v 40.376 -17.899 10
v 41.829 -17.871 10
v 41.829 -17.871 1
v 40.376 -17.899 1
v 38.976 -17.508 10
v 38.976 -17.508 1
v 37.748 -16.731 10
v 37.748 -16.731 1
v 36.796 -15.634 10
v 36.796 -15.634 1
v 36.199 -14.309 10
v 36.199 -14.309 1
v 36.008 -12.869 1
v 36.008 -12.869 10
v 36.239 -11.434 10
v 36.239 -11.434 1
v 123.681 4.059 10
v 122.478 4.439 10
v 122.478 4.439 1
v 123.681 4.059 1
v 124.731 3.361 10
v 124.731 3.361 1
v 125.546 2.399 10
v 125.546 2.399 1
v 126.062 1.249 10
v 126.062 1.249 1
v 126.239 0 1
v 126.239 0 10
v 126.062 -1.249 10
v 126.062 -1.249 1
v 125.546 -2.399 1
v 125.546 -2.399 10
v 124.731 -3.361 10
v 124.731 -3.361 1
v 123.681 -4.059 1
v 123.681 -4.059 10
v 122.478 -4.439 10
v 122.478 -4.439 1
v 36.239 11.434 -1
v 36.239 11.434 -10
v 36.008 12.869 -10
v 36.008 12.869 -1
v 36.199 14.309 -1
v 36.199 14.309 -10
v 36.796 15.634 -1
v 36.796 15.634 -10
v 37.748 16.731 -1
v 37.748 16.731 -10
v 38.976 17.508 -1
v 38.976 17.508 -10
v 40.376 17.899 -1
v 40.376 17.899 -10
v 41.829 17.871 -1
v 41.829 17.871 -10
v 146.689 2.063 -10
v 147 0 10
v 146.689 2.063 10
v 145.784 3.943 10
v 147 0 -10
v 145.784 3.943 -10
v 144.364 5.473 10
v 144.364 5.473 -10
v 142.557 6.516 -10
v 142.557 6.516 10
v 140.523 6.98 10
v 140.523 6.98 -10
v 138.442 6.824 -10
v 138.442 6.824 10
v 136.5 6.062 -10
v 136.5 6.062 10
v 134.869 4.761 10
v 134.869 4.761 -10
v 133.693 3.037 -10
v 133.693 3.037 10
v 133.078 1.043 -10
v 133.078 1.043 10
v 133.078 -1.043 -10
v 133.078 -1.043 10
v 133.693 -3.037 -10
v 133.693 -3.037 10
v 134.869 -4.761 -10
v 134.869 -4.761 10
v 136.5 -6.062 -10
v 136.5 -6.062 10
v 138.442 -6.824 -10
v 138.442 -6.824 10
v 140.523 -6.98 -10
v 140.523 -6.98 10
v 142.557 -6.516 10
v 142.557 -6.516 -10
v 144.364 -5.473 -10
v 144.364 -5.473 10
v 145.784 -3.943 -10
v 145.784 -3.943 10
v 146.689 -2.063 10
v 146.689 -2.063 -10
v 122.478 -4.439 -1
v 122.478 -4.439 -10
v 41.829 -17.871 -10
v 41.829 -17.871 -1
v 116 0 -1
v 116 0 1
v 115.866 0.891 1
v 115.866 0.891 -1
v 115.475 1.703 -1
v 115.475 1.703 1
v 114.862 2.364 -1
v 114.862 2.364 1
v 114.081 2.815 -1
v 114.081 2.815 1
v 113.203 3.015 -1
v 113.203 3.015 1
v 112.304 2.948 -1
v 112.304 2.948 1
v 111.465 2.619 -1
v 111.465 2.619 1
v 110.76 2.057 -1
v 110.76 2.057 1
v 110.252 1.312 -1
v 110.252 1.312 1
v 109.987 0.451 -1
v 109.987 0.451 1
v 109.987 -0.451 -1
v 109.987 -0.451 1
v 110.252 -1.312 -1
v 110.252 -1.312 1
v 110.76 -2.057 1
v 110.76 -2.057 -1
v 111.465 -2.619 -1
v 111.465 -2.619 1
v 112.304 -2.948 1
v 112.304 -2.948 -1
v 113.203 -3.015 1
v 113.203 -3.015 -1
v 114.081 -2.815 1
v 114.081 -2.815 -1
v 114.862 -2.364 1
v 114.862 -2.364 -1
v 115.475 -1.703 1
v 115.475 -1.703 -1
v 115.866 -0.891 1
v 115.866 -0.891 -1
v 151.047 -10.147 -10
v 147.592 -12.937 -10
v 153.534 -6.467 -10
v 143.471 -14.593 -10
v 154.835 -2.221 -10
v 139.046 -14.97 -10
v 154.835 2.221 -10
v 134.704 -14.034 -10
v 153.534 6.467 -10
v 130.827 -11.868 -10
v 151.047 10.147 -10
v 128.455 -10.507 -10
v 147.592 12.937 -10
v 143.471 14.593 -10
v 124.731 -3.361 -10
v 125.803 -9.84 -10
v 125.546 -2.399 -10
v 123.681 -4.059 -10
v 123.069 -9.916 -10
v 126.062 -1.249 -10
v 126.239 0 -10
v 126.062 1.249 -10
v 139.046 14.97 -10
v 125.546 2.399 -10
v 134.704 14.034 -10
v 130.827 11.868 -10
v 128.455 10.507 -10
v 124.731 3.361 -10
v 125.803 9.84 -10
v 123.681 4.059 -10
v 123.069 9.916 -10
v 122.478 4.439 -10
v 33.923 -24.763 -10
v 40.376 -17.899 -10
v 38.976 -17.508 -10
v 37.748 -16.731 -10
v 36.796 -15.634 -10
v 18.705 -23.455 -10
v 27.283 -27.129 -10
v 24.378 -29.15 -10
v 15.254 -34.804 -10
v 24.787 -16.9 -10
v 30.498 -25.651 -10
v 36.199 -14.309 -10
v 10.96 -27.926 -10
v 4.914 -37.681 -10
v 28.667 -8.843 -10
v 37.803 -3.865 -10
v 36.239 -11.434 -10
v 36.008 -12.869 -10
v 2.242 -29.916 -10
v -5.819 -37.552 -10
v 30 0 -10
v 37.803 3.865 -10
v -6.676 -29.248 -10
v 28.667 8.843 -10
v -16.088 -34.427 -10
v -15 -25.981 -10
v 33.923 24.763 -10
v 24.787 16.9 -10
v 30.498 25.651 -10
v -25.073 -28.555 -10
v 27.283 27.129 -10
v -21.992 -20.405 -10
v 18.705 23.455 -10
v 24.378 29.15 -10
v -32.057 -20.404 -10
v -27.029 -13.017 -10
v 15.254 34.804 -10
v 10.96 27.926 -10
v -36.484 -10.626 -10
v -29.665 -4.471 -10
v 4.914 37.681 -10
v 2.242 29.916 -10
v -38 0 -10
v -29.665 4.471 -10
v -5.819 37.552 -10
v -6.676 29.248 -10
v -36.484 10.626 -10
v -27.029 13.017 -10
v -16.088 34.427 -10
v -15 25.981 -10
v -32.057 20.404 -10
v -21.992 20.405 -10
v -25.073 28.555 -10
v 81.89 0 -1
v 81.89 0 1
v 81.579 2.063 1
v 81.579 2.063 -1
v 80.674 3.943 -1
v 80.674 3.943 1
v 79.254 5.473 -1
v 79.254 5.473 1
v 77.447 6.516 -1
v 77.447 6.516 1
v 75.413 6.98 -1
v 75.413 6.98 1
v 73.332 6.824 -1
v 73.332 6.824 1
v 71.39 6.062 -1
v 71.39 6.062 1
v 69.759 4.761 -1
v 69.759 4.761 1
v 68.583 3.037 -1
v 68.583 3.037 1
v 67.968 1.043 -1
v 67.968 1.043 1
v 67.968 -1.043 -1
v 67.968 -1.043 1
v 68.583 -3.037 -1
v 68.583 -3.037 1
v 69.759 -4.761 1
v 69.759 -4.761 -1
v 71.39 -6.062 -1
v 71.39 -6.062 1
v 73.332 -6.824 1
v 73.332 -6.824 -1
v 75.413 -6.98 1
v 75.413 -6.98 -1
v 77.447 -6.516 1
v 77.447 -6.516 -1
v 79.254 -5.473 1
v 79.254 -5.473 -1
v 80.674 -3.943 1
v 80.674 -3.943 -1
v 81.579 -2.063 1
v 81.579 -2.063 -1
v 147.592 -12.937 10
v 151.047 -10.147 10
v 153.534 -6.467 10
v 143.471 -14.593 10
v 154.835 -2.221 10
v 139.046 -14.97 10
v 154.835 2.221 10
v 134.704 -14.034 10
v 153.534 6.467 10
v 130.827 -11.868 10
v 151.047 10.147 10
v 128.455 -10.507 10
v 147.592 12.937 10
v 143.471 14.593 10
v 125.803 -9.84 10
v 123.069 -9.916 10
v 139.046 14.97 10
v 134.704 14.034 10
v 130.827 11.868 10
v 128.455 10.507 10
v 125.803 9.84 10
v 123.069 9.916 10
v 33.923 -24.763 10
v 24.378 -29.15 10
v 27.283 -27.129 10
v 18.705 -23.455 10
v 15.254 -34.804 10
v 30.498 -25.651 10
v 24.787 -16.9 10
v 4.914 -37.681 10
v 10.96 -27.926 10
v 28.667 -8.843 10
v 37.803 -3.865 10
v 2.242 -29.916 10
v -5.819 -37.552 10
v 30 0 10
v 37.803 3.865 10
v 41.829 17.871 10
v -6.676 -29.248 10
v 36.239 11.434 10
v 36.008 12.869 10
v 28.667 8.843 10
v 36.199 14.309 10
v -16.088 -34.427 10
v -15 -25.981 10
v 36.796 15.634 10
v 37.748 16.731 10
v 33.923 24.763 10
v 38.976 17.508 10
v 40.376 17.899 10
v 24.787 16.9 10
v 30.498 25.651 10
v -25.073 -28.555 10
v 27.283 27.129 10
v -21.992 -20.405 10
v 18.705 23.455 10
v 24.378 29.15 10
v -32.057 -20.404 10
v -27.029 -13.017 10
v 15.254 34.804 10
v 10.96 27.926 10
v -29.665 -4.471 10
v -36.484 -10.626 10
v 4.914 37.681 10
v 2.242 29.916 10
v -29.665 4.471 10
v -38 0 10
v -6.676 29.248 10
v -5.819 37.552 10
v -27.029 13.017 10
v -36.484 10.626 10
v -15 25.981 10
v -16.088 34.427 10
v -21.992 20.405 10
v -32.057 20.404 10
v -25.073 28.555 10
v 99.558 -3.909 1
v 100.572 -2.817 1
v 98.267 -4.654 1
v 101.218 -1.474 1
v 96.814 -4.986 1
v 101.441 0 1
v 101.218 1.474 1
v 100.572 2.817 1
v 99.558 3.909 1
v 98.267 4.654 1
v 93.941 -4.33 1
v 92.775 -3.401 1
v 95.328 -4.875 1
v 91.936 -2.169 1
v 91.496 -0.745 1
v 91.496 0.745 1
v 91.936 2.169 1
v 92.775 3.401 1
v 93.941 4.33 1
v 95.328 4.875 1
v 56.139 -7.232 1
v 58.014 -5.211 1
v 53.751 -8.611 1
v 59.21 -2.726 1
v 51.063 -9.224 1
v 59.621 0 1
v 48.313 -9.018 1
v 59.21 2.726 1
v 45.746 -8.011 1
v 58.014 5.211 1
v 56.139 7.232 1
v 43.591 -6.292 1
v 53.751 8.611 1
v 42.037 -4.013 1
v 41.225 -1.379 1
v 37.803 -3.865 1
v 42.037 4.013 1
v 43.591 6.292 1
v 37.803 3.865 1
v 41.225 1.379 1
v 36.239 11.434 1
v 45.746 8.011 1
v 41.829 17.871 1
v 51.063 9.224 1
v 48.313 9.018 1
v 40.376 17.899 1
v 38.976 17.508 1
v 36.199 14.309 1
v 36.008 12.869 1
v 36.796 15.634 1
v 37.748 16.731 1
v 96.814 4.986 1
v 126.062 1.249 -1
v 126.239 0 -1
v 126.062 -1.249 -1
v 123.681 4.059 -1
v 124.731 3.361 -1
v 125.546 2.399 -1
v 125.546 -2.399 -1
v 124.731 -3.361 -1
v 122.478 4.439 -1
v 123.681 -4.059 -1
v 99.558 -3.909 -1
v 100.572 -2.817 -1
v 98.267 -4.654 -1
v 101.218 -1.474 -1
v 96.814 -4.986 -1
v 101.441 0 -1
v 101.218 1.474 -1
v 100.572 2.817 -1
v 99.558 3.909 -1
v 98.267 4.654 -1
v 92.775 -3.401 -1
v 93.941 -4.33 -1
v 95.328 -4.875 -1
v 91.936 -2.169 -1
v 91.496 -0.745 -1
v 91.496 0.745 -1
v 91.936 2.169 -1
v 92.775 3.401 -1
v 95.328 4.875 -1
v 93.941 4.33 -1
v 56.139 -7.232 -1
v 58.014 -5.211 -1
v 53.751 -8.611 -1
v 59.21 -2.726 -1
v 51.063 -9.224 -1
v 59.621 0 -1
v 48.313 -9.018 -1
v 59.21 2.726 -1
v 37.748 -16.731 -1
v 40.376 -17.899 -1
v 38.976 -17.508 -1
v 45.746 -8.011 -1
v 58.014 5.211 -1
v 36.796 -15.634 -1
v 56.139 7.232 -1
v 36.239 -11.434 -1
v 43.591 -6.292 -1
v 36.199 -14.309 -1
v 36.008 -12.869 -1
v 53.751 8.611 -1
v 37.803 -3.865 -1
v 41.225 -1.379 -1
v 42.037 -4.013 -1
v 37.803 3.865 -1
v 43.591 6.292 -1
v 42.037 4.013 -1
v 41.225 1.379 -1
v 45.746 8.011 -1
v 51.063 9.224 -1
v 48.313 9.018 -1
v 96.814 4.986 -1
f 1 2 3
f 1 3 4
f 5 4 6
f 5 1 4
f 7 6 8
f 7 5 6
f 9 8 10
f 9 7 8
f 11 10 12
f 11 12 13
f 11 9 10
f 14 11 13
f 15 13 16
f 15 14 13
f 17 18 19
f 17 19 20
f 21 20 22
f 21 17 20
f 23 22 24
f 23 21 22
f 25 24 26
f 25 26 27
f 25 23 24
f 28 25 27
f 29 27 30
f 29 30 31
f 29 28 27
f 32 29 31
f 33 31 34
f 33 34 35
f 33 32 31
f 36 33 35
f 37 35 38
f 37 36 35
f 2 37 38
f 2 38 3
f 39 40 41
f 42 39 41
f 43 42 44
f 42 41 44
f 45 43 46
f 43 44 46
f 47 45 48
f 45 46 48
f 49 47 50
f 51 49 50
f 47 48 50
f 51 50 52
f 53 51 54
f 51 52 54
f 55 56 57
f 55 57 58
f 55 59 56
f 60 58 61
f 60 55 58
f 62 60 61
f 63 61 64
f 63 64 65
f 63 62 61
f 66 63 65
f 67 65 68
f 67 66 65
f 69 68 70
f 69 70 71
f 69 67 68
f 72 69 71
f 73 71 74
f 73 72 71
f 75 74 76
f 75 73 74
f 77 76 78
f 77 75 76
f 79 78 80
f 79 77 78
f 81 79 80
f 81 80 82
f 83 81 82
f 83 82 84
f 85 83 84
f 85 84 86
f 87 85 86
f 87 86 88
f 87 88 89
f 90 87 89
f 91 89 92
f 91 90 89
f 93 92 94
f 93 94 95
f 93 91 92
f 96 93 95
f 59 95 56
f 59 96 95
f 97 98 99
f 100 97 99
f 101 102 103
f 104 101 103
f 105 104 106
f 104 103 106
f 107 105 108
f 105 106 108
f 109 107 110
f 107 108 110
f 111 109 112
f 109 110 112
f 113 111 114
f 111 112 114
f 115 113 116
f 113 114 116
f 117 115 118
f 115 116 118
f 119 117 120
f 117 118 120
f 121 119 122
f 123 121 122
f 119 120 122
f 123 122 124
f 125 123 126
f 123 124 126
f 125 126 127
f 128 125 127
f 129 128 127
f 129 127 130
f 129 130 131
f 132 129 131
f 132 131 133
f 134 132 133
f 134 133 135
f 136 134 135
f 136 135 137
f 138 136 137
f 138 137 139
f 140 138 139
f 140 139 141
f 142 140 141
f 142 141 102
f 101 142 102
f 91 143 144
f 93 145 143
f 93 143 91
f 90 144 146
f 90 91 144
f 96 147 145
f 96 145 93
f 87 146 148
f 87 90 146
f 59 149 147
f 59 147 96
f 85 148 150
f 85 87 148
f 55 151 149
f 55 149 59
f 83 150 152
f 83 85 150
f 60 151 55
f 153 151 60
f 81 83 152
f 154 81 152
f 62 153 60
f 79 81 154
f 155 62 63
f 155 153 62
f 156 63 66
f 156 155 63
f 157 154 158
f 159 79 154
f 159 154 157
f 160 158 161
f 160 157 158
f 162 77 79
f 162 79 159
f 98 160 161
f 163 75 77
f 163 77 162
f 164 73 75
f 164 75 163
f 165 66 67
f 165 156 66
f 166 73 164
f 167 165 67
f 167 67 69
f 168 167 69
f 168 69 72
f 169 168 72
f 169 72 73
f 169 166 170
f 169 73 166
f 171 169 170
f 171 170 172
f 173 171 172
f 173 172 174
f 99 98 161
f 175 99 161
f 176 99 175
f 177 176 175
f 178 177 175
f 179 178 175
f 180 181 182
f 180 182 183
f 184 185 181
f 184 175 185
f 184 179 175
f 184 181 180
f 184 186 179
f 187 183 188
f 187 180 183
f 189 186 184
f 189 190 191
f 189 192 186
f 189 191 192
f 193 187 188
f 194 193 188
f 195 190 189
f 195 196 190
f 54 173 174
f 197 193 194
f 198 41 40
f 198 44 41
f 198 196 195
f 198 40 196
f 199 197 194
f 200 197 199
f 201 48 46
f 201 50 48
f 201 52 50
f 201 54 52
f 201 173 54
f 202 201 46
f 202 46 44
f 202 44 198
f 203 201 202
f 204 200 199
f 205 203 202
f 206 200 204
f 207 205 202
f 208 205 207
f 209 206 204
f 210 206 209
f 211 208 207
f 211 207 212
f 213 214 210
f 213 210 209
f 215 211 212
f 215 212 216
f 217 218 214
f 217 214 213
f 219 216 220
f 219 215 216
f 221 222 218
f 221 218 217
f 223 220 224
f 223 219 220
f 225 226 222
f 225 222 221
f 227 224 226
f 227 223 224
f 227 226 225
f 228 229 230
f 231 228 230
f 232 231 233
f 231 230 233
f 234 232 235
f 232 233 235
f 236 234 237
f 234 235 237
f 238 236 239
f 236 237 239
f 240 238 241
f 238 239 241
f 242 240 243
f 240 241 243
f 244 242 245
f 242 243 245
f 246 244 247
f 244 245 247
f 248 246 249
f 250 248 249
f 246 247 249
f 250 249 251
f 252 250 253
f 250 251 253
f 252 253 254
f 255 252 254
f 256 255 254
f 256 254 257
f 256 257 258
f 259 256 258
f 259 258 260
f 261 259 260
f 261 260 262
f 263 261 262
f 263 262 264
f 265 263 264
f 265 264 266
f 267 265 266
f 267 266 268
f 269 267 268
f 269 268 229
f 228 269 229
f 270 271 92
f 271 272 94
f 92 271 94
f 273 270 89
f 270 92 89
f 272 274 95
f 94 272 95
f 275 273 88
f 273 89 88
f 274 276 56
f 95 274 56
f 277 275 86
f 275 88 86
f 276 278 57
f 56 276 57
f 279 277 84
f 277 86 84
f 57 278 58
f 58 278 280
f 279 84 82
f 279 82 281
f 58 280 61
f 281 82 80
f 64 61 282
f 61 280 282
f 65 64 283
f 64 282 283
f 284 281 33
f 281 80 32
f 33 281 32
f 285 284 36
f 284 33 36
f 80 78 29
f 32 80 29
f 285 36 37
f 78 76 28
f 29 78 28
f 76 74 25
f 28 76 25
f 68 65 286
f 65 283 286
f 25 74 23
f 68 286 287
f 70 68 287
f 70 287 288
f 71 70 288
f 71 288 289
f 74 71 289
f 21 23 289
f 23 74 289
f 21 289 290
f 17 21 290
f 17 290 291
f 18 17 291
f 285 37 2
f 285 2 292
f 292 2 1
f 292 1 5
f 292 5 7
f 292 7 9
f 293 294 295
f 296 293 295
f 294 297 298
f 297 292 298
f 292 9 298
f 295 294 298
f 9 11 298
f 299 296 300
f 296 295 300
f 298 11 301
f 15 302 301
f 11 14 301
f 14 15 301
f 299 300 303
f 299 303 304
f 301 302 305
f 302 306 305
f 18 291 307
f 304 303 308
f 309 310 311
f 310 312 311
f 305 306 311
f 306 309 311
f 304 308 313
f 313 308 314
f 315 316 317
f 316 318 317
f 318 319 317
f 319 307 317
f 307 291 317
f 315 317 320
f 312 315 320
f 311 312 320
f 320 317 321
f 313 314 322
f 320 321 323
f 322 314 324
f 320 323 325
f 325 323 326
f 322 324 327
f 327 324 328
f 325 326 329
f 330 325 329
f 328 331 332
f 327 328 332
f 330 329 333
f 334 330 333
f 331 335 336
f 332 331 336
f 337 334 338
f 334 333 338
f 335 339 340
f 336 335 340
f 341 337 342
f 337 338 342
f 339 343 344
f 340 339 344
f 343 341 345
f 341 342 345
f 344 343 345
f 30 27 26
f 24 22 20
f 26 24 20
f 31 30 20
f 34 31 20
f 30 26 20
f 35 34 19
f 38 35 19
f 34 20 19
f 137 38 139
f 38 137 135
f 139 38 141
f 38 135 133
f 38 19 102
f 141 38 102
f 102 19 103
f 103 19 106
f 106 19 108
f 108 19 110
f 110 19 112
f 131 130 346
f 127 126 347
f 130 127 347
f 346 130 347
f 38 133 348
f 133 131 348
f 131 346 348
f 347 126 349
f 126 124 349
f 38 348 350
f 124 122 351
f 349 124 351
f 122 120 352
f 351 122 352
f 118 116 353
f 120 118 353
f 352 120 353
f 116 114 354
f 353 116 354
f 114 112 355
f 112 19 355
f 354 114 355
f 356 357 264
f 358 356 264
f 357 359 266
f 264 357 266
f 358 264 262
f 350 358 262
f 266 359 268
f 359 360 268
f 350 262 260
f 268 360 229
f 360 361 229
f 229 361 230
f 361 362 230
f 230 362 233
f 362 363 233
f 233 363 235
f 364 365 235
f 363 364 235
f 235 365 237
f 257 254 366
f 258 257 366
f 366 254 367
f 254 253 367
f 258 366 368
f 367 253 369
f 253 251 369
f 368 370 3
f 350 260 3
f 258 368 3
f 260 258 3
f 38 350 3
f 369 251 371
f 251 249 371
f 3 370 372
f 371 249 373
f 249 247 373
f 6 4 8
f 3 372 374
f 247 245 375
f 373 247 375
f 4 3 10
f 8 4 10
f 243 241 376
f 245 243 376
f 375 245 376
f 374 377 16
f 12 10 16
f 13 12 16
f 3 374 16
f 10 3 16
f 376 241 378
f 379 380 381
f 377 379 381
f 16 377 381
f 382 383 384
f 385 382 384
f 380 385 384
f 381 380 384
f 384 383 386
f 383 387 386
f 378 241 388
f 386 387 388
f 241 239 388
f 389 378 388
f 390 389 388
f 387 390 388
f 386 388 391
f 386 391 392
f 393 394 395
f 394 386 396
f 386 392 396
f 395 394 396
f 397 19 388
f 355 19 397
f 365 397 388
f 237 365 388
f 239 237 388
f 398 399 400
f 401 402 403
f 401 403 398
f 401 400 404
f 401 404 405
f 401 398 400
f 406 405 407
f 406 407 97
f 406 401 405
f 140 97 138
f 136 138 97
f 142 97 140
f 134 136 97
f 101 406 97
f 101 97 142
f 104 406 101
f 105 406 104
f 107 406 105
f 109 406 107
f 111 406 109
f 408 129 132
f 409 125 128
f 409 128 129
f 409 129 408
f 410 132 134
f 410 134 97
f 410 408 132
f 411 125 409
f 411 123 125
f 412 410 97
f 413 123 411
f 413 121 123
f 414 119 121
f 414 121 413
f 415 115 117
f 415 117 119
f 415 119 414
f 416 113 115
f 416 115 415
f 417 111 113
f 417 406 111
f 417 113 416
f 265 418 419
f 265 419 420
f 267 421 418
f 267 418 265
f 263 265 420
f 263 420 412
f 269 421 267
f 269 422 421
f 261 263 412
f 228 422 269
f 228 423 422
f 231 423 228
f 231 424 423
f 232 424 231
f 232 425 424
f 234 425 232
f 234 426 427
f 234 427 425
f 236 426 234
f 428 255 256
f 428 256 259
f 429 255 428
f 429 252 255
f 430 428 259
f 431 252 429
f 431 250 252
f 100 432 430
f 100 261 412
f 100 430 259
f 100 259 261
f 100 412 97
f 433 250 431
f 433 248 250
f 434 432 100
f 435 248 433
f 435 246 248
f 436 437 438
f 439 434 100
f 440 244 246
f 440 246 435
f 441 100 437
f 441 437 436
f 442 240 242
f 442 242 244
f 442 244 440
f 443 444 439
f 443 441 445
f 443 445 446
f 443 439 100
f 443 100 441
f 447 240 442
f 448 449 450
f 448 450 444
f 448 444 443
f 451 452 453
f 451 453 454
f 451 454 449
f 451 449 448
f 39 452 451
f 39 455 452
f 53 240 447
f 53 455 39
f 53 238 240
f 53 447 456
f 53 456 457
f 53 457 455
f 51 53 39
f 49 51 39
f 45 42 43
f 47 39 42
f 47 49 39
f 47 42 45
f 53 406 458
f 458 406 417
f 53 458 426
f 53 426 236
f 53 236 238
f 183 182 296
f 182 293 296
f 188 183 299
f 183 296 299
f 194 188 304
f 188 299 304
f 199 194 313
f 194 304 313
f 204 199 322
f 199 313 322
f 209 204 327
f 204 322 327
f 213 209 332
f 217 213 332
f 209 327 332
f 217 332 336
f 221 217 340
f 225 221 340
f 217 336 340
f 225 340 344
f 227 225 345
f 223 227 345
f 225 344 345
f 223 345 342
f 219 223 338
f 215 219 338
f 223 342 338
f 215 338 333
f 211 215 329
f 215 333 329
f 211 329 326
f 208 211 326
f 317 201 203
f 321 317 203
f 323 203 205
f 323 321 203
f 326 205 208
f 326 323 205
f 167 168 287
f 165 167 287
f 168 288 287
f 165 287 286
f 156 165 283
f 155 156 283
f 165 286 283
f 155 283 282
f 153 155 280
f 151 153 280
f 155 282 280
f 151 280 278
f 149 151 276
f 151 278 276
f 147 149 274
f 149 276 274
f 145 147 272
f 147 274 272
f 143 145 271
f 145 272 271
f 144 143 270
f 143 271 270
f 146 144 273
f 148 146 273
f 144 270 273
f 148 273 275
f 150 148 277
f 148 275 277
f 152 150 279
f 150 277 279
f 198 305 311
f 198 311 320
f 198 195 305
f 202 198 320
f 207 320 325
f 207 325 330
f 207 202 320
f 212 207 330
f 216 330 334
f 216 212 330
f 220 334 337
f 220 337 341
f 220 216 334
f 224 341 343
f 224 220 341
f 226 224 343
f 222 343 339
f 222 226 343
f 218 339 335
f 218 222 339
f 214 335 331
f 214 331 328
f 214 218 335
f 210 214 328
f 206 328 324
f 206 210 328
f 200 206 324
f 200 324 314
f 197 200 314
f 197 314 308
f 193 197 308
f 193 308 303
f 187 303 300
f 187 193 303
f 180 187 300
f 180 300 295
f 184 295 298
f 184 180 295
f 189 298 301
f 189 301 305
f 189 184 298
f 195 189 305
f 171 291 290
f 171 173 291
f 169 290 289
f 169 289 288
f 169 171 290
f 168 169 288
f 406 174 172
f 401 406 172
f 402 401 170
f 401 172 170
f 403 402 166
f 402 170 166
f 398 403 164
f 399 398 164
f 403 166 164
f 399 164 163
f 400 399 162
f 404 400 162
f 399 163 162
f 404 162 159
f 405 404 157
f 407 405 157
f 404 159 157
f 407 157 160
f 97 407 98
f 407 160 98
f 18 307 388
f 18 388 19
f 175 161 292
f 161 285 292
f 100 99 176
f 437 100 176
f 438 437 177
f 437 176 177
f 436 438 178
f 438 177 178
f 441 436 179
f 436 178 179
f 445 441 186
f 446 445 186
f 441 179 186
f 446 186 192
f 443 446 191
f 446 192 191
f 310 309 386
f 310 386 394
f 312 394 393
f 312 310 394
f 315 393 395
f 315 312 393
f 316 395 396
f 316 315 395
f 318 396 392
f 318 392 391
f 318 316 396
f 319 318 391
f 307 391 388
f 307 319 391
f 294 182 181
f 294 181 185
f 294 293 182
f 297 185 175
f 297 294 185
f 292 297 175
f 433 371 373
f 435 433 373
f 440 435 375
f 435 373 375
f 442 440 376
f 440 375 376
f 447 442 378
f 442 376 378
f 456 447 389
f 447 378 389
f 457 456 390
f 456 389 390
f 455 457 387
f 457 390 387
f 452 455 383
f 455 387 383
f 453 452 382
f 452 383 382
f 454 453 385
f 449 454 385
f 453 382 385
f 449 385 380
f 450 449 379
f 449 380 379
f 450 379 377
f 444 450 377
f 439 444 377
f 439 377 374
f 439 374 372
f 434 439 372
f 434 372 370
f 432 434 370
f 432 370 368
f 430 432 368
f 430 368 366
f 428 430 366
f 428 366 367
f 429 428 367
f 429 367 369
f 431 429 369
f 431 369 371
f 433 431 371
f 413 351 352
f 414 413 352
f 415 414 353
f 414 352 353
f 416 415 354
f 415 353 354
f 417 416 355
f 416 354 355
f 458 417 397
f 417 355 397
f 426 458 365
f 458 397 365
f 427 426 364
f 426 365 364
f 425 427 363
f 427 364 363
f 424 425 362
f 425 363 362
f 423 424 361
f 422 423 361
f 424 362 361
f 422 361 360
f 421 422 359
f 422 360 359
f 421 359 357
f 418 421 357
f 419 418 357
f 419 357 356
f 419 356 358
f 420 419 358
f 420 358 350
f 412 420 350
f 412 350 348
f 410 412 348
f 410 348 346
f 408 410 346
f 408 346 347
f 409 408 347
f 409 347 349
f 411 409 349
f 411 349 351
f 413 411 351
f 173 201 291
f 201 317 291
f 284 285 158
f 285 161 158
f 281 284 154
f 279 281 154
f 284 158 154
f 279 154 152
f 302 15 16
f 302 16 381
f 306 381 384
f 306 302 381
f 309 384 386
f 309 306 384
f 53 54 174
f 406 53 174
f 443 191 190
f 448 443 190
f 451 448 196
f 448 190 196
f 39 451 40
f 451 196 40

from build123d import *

# Parameters (mm, degrees)
SKETCH1_R           = 30
SKETCH1_R_2         = 7
BOSS_EXTRUDE1_DEPTH = 10
FILLET1_R           = 10
FILLET2_R           = 20
CUT_EXTRUDE1_DEPTH  = 9
SKETCH3_R           = 9.25
SKETCH3_R_2         = 7
SKETCH3_R_3         = 5
SKETCH3_R_4         = 3.023758928
CUT_EXTRUDE2_DEPTH  = 12


with BuildPart() as part:
    # Sketch1 → Boss-Extrude1 (new body, symmetric)
    with BuildSketch(Plane.XY):
        with BuildLine():
            Line((27.935473676, 25.760615491), (128.063755469, 9.084385863))
            ThreePointArc((128.063755469, 9.084385863), (155, 0), (128.063755469, -9.084385863))
            Line((128.063755469, -9.084385863), (27.935473676, -25.760615491))
            ThreePointArc((27.935473676, -25.760615491), (-38, 0), (27.935473676, 25.760615491))
        make_face()
        Circle(SKETCH1_R, mode=Mode.SUBTRACT)
        with Locations((140, 0)):
            Circle(SKETCH1_R_2, mode=Mode.SUBTRACT)
    extrude(amount=BOSS_EXTRUDE1_DEPTH, both=True)

    # Fillet1
    fillet1_edges = [part.edges().sort_by_distance(p)[0] for p in [
        (128.063755469, 9.084385863, 0),
        (128.063755469, -9.084385863, 0),
    ]]
    fillet(fillet1_edges, radius=FILLET1_R)

    # Fillet2
    fillet2_edges = [part.edges().sort_by_distance(p)[0] for p in [
        (27.935473676, 25.760615491, 0),
        (27.935473676, -25.760615491, 0),
    ]]
    fillet(fillet2_edges, radius=FILLET2_R)

    # Sketch2 → Cut-Extrude1 (cut)
    with BuildSketch(Plane.XY.offset(10)):
        with BuildLine():
            Line((41.828554558, 17.870982725), (122.478416149, 4.438857582))
            ThreePointArc((122.478416149, 4.438857582), (126.239130435, 0), (122.478416149, -4.438857582))
            Line((122.478416149, -4.438857582), (41.828554558, -17.870982725))
            ThreePointArc((41.828554558, -17.870982725), (37.231968897, -16.217361812), (36.238855523, -11.43439331))
            ThreePointArc((36.238855523, -11.43439331), (38, 0), (36.238855523, 11.43439331))
            ThreePointArc((36.238855523, 11.43439331), (37.231968897, 16.217361812), (41.828554558, 17.870982725))
        make_face()
    cut_extrude1 = extrude(amount=-CUT_EXTRUDE1_DEPTH, mode=Mode.SUBTRACT)

    # Mirror1: Cut-Extrude1 across plane
    add(cut_extrude1.mirror(Plane.XY), mode=Mode.SUBTRACT)

    # Sketch3 → Cut-Extrude2 (cut, through all)
    with BuildSketch(Plane.XY.offset(1)):
        with Locations((50.371368822, 0)):
            Circle(SKETCH3_R)
        with Locations((74.88991016, 0)):
            Circle(SKETCH3_R_2)
        with Locations((96.440508127, 0)):
            Circle(SKETCH3_R_3)
        with Locations((112.976627131, 0)):
            Circle(SKETCH3_R_4)
    extrude(amount=-CUT_EXTRUDE2_DEPTH, mode=Mode.SUBTRACT)


solid = part.part
